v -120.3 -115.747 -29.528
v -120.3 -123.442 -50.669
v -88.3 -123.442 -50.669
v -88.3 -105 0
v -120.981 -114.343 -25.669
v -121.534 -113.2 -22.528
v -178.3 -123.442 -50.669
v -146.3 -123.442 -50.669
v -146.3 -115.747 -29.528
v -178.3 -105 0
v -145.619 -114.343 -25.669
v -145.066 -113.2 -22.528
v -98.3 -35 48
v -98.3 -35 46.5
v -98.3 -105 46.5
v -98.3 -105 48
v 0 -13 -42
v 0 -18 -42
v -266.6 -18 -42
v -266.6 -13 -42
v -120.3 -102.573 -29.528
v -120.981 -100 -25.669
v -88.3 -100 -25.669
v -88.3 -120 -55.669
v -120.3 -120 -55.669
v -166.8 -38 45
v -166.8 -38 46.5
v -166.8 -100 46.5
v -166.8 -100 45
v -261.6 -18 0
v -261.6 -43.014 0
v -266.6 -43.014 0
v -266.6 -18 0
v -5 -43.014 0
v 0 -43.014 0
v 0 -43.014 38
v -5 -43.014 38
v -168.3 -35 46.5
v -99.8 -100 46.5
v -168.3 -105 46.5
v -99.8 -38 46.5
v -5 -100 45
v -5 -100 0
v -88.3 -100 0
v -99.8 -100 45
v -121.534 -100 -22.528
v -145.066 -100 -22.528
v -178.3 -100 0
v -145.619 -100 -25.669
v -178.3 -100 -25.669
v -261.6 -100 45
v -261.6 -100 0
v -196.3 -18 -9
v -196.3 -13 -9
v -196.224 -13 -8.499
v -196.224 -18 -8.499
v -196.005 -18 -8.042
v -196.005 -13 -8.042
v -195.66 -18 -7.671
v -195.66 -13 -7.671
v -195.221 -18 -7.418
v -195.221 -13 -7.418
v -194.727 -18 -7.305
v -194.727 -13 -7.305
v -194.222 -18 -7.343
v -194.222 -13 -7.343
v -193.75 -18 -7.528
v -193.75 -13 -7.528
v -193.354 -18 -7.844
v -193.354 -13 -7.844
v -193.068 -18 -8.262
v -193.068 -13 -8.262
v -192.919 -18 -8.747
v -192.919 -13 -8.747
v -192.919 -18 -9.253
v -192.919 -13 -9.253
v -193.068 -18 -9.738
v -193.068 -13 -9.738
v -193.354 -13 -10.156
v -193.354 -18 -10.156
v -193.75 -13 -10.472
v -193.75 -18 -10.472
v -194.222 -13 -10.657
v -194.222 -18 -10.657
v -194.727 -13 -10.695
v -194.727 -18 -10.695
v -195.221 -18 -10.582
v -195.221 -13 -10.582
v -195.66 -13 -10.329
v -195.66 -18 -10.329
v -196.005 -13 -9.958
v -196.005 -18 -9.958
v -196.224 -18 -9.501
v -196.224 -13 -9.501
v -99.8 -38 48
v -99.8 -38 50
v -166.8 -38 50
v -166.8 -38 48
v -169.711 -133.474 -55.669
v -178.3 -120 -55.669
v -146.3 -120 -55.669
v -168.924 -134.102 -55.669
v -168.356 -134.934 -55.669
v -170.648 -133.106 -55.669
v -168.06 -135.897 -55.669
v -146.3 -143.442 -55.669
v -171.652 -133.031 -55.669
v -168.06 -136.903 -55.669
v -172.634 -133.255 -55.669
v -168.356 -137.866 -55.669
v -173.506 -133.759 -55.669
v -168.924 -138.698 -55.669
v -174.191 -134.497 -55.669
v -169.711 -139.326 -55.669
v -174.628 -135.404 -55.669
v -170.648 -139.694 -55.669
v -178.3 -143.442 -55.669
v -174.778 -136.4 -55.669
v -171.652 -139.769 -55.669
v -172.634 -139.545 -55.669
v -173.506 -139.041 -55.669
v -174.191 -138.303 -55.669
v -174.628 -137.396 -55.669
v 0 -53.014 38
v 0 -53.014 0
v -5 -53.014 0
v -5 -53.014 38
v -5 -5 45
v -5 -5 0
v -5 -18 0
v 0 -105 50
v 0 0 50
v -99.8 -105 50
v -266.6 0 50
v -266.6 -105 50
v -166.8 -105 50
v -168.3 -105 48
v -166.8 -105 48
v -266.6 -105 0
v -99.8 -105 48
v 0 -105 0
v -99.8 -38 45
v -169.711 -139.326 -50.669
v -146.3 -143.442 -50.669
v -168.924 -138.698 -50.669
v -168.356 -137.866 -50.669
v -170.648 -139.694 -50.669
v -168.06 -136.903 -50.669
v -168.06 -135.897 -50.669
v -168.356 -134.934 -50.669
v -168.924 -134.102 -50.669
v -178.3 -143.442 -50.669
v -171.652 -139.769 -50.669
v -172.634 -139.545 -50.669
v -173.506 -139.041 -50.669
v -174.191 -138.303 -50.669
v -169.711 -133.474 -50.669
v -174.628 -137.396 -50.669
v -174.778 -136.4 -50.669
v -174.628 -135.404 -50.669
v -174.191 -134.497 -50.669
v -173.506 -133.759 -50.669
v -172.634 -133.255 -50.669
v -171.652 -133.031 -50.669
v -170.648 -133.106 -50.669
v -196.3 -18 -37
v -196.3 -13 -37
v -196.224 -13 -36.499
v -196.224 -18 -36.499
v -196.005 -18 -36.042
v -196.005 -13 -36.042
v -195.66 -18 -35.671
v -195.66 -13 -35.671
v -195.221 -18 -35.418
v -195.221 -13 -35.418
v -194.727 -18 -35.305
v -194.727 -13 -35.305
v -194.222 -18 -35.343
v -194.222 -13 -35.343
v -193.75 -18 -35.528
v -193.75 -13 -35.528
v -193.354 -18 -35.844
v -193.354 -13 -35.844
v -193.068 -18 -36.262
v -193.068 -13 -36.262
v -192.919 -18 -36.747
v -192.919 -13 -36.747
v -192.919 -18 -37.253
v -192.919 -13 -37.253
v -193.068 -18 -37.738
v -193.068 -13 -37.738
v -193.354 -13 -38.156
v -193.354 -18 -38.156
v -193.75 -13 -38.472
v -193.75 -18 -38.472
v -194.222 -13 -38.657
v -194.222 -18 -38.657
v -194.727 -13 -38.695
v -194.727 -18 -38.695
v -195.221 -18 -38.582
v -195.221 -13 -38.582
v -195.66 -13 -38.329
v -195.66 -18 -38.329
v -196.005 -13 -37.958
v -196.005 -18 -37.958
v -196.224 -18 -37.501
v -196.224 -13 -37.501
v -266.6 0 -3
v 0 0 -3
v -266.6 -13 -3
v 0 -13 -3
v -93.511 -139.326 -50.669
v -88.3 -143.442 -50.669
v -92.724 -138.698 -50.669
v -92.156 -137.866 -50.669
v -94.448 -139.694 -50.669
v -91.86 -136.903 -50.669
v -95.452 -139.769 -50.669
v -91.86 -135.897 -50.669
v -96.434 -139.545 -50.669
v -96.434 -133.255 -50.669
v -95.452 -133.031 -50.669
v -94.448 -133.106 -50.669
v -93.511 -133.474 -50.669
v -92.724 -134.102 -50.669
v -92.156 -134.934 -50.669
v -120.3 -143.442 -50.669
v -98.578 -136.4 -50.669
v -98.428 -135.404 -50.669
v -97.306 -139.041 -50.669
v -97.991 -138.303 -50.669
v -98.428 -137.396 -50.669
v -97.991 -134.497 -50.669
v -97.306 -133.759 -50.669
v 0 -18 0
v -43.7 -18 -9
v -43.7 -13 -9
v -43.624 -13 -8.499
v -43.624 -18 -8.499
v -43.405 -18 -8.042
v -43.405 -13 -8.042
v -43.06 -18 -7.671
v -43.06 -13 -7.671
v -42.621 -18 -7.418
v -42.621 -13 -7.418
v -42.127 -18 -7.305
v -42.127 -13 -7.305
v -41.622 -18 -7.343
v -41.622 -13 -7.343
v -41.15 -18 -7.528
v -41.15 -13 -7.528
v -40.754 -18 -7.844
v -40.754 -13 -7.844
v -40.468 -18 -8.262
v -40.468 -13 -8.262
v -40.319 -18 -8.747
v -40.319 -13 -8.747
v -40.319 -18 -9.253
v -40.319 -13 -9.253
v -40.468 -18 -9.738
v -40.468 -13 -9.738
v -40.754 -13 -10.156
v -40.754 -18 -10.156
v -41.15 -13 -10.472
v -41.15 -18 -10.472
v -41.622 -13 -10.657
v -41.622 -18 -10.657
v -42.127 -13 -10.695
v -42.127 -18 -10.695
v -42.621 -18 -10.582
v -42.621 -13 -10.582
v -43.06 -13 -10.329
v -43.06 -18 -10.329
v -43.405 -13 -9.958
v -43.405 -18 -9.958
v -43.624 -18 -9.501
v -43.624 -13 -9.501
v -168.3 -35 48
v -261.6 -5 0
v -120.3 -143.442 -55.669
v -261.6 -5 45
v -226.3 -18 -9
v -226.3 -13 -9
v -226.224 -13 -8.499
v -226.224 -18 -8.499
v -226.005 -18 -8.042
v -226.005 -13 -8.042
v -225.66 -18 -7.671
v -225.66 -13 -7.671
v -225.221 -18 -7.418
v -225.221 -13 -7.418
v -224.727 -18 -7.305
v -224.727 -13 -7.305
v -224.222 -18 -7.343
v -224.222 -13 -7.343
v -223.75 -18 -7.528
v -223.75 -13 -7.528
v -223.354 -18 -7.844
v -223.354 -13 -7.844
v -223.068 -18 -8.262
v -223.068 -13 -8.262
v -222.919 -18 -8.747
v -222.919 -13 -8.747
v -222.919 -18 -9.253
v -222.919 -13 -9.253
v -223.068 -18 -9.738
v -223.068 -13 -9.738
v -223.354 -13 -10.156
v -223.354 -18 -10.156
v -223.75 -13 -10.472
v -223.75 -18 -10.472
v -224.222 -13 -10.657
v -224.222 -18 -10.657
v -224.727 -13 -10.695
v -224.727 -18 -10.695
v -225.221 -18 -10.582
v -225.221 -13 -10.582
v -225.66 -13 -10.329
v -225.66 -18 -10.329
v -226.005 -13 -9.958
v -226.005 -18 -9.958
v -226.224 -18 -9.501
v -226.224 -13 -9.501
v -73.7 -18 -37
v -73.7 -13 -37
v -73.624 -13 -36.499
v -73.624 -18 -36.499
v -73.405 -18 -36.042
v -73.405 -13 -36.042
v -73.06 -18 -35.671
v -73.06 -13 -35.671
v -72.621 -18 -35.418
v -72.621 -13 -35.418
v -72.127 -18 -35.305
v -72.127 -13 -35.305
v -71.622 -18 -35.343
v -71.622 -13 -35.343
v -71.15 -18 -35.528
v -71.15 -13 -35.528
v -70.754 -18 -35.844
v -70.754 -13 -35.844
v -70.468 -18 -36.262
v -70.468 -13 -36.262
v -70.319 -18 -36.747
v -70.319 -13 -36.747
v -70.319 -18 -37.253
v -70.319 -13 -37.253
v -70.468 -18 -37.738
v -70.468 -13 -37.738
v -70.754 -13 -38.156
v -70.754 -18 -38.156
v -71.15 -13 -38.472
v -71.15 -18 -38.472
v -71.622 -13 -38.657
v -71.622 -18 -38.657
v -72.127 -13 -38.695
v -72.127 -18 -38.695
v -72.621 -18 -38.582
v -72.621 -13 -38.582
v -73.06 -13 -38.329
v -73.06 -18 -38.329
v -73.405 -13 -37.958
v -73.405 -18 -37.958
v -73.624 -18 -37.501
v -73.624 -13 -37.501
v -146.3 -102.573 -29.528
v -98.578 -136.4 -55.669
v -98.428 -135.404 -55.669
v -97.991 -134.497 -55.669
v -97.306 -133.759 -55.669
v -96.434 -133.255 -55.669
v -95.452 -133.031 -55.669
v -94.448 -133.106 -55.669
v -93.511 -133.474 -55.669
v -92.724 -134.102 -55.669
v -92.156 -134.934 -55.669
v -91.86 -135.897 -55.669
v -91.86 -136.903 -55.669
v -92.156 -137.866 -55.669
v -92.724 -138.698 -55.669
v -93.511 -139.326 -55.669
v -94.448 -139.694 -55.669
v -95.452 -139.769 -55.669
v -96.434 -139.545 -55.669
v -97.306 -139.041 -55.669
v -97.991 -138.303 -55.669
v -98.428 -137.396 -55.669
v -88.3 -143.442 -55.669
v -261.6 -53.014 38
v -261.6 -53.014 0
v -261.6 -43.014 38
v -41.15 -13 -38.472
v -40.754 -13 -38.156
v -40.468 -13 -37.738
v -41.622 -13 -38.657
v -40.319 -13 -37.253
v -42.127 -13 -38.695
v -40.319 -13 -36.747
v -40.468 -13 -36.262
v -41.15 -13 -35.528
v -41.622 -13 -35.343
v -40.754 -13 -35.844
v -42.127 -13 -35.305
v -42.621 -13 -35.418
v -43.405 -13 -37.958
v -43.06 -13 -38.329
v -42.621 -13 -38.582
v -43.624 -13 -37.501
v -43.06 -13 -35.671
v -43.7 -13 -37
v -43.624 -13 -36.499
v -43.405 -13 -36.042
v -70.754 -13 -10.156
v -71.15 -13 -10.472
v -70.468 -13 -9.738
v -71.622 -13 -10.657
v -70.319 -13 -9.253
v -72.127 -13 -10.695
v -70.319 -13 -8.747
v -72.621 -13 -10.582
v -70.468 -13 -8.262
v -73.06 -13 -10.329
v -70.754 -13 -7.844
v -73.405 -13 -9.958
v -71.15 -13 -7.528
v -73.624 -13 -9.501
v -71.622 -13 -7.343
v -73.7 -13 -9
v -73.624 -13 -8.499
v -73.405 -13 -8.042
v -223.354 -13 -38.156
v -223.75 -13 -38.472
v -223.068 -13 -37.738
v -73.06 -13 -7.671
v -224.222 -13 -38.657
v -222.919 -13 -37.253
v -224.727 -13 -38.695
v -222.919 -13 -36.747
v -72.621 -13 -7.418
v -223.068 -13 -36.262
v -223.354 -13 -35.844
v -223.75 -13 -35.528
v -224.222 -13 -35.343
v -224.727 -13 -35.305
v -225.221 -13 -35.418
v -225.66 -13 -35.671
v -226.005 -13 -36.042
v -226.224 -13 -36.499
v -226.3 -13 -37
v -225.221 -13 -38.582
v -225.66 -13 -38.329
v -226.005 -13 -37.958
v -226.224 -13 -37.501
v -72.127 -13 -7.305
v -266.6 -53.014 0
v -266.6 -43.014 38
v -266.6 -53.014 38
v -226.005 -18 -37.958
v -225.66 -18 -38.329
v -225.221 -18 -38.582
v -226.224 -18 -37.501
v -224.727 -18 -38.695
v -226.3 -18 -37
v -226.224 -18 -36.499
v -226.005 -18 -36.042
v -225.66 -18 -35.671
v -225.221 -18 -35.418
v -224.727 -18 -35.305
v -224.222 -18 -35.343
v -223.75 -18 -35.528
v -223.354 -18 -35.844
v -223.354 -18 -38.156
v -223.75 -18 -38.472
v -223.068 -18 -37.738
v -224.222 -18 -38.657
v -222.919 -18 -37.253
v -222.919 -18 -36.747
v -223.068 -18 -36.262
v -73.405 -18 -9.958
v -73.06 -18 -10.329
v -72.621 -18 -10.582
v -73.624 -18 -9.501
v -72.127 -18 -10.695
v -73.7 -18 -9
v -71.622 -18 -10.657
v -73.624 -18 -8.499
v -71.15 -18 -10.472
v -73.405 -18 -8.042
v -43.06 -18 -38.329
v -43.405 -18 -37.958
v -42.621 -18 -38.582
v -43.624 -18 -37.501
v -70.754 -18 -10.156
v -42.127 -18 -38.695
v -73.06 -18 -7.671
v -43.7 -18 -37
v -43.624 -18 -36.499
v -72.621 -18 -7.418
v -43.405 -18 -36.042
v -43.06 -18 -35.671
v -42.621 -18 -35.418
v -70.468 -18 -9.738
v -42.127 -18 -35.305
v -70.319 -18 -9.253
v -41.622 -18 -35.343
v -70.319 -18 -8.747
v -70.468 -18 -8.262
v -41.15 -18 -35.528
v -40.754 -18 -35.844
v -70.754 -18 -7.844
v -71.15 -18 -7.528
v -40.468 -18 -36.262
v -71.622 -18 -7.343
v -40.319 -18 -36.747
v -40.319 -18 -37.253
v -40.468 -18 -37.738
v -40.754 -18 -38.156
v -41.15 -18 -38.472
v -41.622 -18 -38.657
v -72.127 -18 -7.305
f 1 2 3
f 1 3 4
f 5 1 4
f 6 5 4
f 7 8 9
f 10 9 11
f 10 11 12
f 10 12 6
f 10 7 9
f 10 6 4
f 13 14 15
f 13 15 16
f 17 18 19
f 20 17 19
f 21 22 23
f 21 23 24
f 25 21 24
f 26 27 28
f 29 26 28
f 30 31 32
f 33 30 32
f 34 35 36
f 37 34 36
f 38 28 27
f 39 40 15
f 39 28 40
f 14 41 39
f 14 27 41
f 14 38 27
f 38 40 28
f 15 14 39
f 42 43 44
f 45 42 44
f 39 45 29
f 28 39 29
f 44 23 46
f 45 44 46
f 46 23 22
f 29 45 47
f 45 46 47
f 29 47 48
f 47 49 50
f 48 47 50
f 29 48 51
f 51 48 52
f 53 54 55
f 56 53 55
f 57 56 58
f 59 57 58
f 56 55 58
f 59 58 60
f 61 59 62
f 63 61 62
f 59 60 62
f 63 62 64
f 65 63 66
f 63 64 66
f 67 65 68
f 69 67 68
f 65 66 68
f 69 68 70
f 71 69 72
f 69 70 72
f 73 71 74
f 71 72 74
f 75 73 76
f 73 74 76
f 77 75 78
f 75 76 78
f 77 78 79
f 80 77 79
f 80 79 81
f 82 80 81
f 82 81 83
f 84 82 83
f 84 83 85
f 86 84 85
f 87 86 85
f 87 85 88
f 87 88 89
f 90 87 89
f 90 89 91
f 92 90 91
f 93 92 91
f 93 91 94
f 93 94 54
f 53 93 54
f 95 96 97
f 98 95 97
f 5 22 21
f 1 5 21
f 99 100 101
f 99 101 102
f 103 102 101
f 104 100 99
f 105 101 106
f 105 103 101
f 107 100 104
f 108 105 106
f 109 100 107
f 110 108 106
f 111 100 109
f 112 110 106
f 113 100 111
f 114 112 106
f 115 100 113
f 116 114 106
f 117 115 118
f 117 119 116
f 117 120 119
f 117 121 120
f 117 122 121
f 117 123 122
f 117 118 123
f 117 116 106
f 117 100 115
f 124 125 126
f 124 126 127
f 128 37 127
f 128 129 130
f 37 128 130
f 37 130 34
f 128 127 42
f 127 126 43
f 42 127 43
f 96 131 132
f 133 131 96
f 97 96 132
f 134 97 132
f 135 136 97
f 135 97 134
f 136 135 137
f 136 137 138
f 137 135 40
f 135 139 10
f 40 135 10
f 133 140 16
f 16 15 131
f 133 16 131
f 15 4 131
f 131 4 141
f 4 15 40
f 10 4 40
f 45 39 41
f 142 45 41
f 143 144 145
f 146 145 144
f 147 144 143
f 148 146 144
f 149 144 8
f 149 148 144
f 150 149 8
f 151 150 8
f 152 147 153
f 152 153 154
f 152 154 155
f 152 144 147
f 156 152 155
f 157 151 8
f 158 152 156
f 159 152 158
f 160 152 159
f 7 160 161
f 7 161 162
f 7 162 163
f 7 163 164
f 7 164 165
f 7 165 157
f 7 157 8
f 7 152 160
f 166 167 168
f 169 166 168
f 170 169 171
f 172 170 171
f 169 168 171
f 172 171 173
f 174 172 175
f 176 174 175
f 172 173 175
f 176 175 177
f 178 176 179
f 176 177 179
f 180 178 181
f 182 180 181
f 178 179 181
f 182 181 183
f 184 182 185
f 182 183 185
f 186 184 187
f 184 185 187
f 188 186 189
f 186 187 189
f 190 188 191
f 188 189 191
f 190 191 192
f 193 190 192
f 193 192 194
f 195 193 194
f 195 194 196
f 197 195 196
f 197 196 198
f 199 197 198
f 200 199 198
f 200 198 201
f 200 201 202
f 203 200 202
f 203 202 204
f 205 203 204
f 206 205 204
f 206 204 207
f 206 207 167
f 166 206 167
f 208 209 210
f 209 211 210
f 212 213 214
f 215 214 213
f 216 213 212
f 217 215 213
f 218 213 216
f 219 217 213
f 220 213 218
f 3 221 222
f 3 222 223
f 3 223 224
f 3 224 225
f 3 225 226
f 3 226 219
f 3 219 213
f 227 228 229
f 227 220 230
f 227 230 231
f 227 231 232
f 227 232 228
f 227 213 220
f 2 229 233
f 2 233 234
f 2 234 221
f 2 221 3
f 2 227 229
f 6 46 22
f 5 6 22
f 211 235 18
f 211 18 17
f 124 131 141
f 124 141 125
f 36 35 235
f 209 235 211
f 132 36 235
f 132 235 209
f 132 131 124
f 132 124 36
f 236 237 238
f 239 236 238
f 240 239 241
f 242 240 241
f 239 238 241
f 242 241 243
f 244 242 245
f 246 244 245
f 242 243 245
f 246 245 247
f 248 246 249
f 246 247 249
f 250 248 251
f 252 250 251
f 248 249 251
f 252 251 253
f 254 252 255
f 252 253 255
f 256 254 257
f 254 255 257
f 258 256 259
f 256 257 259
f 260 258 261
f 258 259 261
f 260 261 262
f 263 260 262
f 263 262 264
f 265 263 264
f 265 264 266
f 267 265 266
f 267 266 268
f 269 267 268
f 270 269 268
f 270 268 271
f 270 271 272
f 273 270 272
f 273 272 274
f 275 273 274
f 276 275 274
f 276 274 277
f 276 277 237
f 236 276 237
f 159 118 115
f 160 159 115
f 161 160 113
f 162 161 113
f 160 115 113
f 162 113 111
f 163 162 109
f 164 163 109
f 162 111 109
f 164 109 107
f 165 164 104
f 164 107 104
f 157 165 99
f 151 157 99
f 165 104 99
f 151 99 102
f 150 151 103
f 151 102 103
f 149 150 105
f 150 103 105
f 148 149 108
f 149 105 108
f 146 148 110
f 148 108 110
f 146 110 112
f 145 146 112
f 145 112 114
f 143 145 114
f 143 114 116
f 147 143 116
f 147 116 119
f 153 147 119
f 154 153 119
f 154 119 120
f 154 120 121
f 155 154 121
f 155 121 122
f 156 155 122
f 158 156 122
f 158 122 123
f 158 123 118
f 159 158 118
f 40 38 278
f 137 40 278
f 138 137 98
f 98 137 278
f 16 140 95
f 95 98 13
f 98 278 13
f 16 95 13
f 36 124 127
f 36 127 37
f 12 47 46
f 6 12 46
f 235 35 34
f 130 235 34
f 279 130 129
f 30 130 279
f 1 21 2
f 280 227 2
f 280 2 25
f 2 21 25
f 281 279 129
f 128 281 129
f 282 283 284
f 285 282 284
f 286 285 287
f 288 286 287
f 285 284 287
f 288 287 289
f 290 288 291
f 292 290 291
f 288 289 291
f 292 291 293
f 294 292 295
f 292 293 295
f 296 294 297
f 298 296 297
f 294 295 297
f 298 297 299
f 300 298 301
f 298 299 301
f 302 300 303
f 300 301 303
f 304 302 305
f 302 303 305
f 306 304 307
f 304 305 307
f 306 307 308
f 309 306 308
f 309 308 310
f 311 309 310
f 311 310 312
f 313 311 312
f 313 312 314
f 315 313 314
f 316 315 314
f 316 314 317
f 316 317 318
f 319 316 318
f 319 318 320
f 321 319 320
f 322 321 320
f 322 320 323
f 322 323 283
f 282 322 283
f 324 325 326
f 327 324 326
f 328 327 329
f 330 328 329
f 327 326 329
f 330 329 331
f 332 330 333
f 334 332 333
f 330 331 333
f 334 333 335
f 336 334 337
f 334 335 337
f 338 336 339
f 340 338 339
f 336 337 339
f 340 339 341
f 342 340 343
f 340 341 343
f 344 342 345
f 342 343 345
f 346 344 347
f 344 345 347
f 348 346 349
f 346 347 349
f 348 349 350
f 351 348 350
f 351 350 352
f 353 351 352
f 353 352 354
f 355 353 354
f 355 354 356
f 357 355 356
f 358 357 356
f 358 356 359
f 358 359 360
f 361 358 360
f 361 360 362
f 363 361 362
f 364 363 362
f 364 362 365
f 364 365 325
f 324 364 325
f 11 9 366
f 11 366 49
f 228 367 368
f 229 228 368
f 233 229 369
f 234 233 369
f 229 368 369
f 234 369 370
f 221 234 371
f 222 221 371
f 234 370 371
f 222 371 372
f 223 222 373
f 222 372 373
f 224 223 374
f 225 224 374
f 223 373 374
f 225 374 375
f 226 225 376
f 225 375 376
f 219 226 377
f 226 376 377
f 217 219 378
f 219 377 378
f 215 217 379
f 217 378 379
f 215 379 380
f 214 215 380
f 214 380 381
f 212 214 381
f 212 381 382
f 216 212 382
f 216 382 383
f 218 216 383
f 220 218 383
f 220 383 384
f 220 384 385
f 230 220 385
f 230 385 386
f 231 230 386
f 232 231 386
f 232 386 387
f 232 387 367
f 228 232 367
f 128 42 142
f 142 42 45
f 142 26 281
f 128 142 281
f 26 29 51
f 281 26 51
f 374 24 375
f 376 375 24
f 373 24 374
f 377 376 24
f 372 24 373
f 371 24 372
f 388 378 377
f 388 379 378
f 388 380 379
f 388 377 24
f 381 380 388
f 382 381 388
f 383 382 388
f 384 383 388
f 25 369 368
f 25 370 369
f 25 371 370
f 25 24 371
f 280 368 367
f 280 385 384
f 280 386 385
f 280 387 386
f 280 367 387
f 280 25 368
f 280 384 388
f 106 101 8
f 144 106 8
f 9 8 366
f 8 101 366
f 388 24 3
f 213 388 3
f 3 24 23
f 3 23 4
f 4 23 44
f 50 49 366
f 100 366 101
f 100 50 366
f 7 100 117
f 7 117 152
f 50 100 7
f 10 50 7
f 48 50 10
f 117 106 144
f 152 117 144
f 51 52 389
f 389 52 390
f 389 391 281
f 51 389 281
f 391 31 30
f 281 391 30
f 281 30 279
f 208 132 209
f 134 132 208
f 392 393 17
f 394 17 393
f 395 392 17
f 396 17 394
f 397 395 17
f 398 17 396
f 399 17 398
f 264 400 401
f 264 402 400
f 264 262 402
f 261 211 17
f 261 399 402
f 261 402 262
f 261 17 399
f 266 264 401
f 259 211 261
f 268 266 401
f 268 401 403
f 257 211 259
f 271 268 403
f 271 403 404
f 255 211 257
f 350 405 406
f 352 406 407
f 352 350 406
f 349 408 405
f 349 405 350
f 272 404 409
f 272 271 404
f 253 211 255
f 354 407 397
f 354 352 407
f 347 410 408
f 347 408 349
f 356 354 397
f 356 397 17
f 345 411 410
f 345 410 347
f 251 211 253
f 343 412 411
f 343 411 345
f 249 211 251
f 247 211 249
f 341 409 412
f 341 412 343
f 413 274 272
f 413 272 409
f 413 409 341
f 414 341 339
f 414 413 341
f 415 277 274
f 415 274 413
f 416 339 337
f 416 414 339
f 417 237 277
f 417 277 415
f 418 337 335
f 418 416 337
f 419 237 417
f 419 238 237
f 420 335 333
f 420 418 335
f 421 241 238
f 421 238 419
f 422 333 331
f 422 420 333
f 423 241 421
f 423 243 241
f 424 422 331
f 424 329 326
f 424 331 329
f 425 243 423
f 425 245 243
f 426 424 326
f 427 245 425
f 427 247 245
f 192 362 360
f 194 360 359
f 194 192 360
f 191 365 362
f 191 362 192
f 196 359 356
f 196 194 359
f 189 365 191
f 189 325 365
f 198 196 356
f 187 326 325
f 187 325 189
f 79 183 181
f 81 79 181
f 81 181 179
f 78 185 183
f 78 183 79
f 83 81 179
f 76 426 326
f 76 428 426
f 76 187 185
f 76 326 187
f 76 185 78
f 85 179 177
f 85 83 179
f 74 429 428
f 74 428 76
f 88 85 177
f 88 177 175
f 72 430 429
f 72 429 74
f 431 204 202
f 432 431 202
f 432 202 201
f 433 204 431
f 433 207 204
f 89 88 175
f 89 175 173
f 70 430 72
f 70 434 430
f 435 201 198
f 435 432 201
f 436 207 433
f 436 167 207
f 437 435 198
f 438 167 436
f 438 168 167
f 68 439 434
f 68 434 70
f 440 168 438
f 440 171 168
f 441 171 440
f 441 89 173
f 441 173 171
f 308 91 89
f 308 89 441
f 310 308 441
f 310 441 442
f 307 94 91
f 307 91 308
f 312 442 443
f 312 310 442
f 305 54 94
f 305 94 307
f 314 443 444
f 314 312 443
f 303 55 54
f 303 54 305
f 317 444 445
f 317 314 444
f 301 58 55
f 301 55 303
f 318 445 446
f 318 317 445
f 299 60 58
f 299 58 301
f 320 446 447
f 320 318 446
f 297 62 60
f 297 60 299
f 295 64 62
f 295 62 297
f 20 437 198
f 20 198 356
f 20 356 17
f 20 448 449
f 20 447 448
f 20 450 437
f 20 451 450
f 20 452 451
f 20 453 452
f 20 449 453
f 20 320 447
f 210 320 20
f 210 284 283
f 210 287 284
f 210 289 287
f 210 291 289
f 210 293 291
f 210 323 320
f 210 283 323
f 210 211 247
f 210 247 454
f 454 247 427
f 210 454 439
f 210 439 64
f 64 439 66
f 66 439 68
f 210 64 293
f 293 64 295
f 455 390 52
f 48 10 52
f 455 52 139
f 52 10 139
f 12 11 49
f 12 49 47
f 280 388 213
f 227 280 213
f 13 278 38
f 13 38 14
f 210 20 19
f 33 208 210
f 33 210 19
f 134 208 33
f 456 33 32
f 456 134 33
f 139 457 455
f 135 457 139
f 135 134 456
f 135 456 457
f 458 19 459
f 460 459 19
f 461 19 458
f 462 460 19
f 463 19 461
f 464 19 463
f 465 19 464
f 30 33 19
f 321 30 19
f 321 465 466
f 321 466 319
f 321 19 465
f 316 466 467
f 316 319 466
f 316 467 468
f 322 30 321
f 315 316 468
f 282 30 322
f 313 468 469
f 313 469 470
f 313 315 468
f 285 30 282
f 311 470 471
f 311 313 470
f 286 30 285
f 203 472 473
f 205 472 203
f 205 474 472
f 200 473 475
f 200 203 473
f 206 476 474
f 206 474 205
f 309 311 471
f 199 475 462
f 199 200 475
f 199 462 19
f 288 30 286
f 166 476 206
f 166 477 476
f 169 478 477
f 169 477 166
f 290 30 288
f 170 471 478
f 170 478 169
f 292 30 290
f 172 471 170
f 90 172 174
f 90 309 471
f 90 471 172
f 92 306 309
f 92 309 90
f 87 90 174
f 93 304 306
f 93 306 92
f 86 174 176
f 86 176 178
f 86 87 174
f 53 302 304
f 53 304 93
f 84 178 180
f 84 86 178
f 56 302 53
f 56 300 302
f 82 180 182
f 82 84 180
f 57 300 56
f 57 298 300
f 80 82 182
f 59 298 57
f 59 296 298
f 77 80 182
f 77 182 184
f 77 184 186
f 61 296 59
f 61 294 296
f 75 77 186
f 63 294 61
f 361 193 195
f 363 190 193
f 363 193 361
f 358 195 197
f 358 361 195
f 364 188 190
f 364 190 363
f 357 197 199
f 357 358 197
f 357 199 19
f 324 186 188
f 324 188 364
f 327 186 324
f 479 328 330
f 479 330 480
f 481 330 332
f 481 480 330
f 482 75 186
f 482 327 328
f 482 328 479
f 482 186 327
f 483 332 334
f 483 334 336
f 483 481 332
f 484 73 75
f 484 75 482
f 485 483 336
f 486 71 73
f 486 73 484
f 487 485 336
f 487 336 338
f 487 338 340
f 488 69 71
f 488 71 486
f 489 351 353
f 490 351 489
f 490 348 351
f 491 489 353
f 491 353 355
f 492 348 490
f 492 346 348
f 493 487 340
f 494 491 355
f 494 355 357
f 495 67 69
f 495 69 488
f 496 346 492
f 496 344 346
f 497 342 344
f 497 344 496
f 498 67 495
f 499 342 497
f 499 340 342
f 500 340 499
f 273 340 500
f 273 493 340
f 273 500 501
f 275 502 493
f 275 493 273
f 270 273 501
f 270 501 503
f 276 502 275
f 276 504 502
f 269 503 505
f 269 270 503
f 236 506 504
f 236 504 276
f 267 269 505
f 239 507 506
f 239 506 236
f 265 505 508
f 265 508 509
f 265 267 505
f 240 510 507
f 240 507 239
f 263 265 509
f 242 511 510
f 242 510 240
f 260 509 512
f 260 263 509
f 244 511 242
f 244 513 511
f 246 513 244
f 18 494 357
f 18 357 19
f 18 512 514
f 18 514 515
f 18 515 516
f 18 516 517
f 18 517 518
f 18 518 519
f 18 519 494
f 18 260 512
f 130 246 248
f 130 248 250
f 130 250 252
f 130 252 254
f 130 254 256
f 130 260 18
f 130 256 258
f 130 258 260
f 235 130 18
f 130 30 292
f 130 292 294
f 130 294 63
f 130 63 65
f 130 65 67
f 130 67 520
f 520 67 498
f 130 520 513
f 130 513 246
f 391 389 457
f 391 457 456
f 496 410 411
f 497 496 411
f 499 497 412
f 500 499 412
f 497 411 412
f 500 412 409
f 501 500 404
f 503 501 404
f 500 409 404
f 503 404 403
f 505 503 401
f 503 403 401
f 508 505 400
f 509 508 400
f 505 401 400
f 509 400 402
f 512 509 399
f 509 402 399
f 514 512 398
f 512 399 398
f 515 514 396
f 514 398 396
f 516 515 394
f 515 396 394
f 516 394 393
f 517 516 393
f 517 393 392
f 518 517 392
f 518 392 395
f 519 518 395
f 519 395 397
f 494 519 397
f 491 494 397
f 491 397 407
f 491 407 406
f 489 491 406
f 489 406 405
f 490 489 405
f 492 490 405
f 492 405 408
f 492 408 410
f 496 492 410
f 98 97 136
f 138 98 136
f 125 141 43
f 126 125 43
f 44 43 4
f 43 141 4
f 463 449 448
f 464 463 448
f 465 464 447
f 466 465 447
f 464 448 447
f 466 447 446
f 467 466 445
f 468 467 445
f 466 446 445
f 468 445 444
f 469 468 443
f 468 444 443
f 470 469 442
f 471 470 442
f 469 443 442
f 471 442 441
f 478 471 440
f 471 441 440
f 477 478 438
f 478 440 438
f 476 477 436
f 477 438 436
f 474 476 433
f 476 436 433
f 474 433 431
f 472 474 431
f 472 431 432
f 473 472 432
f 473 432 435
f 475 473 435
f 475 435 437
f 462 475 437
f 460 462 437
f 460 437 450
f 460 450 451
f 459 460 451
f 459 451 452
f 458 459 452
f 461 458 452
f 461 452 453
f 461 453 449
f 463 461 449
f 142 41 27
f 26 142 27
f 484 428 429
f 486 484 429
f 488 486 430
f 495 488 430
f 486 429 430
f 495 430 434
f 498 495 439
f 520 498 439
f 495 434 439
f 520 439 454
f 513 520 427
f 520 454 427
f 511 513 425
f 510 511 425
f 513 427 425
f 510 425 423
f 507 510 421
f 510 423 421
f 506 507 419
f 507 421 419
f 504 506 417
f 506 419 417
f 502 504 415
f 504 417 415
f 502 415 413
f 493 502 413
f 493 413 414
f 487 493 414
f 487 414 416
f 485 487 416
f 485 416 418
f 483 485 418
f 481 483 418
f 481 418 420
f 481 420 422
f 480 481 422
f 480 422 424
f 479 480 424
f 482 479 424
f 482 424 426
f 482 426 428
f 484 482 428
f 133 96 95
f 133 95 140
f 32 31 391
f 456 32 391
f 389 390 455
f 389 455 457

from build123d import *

# Parameters (mm, degrees)
SKETCH1_W                     = 5
SKETCH1_H                     = 47.5
SKETCH1_W_2                   = 67
SKETCH1_H_2                   = 5
SKETCH1_H_3                   = 34.5
SKETCH1_H_4                   = 8
WALLS_DEPTH                   = 50
ROOF_START                    = 50
SKETCH1_3_W                   = 266.6000032
SKETCH1_3_H                   = 105
SKETCH1_3_W_2                 = 67
SKETCH1_3_H_2                 = 67
ROOF_DEPTH                    = 5
SKETCH1_4_W                   = 256.6000032
SKETCH1_4_H                   = 5
SKETCH1_4_W_2                 = 5
SPACER_DEPTH                  = 42
FIBER_CUTOUT_DEPTH            = 291.861757036
FIBER_CUTOUT_DEPTH_BACK       = 291.861757036
SKETCH2_W                     = 38
SKETCH2_H                     = 10
M3_CLEARANCE_HOLE_D           = 3.4
SKETCH1_6_W                   = 5
SKETCH1_6_H                   = 8
SKETCH1_6_W_2                 = 256.6000032
REAR_WALL_FLOOR_DEPTH         = 3
WINDOW_THROUGH_CUT_DEPTH      = 291.861757036
WINDOW_THROUGH_CUT_DEPTH_BACK = 70
SKETCH6_W                     = 70
SKETCH6_H                     = 1.5
WINDOW_START                  = 50
SKETCH1_8_W                   = 67
SKETCH1_8_H                   = 47.5
SKETCH1_8_H_2                 = 14.5
WINDOW_SLOT_CUT_DEPTH         = 5
SKETCH1_9_W                   = 67
SKETCH1_9_H                   = 5
WINDOW_EDGE_THROUGH_CUT_DEPTH = 3.5
FRONT_LEG_MOUNTING_DEPTH      = 45
FRONT_LEG_MOUNTING_DEPTH_BACK = 45
F_1_4_CLEARANCE_HOLE1_D       = 6.7564
FRONT_HOLE_CUTOUT_REACH       = 292.129


with BuildPart() as part:
    # Sketch1 → Walls (new body)
    with BuildSketch(Plane(origin=(0, 0, 0), x_dir=(-1, 0, 0), z_dir=(0, 0, 1))):
        Polygon((0, 105), (0, 100), (5, 100), (99.8000016, 100), (99.8000016, 105), align=None)
        Polygon((166.8000016, 100), (261.6000032, 100), (266.6000032, 100), (266.6000032, 105), (166.8000016, 105), align=None)
        with Locations((264.1000032, 76.25)):
            Rectangle(SKETCH1_W, SKETCH1_H)
        with Locations((133.3000016, 102.5)):
            Rectangle(SKETCH1_W_2, SKETCH1_H_2)
        with Locations((264.1000032, 35.25)):
            Rectangle(SKETCH1_W, SKETCH1_H_3)
        with Locations((264.1000032, 15.5)):
            Rectangle(SKETCH1_W, SKETCH1_H_2)
        with Locations((264.1000032, 9)):
            Rectangle(SKETCH1_W, SKETCH1_H_4)
        Polygon((5, 5), (0, 5), (0, 0), (266.6000032, 0), (266.6000032, 5), (261.6000032, 5), align=None)
        with Locations((2.5, 9)):
            Rectangle(SKETCH1_W, SKETCH1_H_4)
        with Locations((2.5, 15.5)):
            Rectangle(SKETCH1_W, SKETCH1_H_2)
        with Locations((2.5, 35.25)):
            Rectangle(SKETCH1_W, SKETCH1_H_3)
        with Locations((2.5, 76.25)):
            Rectangle(SKETCH1_W, SKETCH1_H)
    extrude(amount=WALLS_DEPTH)

    # Sketch1<3> → roof (add)
    with BuildSketch(Plane(origin=(0, 0, 0), x_dir=(-1, 0, 0), z_dir=(0, 0, 1)).offset(ROOF_START)):
        with Locations((133.3000016, 52.5)):
            Rectangle(SKETCH1_3_W, SKETCH1_3_H)
        with Locations((133.3000016, 71.5)):
            Rectangle(SKETCH1_3_W_2, SKETCH1_3_H_2)
    extrude(amount=-ROOF_DEPTH)

    # Sketch1<4> → spacer (add)
    with BuildSketch(Plane(origin=(0, 0, 0), x_dir=(-1, 0, 0), z_dir=(0, 0, 1))):
        with Locations((133.3000016, 15.5)):
            Rectangle(SKETCH1_4_W, SKETCH1_4_H)
        with Locations((2.5, 15.5)):
            Rectangle(SKETCH1_4_W_2, SKETCH1_4_H)
        with Locations((264.1000032, 15.5)):
            Rectangle(SKETCH1_4_W_2, SKETCH1_4_H)
    extrude(amount=-SPACER_DEPTH)

    # Sketch2 → fiber cutout (cut, two sides: drawn at the far end of the back side and taken through both)
    with BuildSketch(Plane.ZY.offset(266.6000032).offset(-FIBER_CUTOUT_DEPTH_BACK)):
        with Locations((19, -48.0141)):
            Rectangle(SKETCH2_W, SKETCH2_H)
    extrude(amount=FIBER_CUTOUT_DEPTH + FIBER_CUTOUT_DEPTH_BACK, mode=Mode.SUBTRACT)

    # M3 Clearance Hole (through all)
    with Locations(Plane.XZ.offset(18)):
        with Locations((-224.6, -9), (-42, -9), (-72, -9), (-72, -37), (-42, -37), (-224.6, -37), (-194.6, -37), (-194.6, -9)):
            Hole(M3_CLEARANCE_HOLE_D / 2)

    # Sketch1<6> → rear wall floor (add)
    with BuildSketch(Plane(origin=(0, 0, 0), x_dir=(-1, 0, 0), z_dir=(0, 0, 1))):
        Polygon((5, 5), (0, 5), (0, 0), (266.6000032, 0), (266.6000032, 5), (261.6000032, 5), align=None)
        with Locations((2.5, 9)):
            Rectangle(SKETCH1_6_W, SKETCH1_6_H)
        with Locations((133.3000016, 9)):
            Rectangle(SKETCH1_6_W_2, SKETCH1_6_H)
        with Locations((264.1000032, 9)):
            Rectangle(SKETCH1_6_W, SKETCH1_6_H)
    extrude(amount=-REAR_WALL_FLOOR_DEPTH)

    # Sketch6 → window through cut (cut, two sides: drawn at the far end of the back side and taken through both)
    with BuildSketch(Plane.XZ.offset(105).offset(-WINDOW_THROUGH_CUT_DEPTH_BACK)):
        with Locations((-133.3000016, 47.25)):
            Rectangle(SKETCH6_W, SKETCH6_H)
    extrude(amount=WINDOW_THROUGH_CUT_DEPTH + WINDOW_THROUGH_CUT_DEPTH_BACK, mode=Mode.SUBTRACT)

    # Sketch1<8> → window slot cut (cut)
    with BuildSketch(Plane(origin=(0, 0, 0), x_dir=(-1, 0, 0), z_dir=(0, 0, 1)).offset(WINDOW_START)):
        with Locations((133.3000016, 76.25)):
            Rectangle(SKETCH1_8_W, SKETCH1_8_H)
        with Locations((133.3000016, 45.25)):
            Rectangle(SKETCH1_8_W, SKETCH1_8_H_2)
    extrude(amount=-WINDOW_SLOT_CUT_DEPTH, mode=Mode.SUBTRACT)

    # Sketch1<9> → window edge through cut (cut)
    with BuildSketch(Plane(origin=(0, 0, 0), x_dir=(-1, 0, 0), z_dir=(0, 0, 1)).offset(WINDOW_START)):
        with Locations((133.3000016, 102.5)):
            Rectangle(SKETCH1_9_W, SKETCH1_9_H)
    extrude(amount=-WINDOW_EDGE_THROUGH_CUT_DEPTH, mode=Mode.SUBTRACT)

    # Sketch7 → Front leg mounting (add, two sides: drawn at the far end of the back side and taken through both)
    with BuildSketch(Plane(origin=(-133.3000016, 0, 50), x_dir=(0, 0, -1), z_dir=(1, 0, 0)).offset(-FRONT_LEG_MOUNTING_DEPTH_BACK)):
        Polygon((105.668753763, -120), (105.668753763, -143.441918177), (100.668753763, -143.441918177), (100.668753763, -123.441918177), (50, -105), (50, -100), (75.668753763, -100), align=None)
    extrude(amount=FRONT_LEG_MOUNTING_DEPTH + FRONT_LEG_MOUNTING_DEPTH_BACK)

    # 1/4 Clearance Hole1 (through all)
    with Locations(Plane.XY.offset(-50.668753763)):
        with Locations((-95.2000016, -136.4), (-171.4000016, -136.4)):
            Hole(F_1_4_CLEARANCE_HOLE1_D / 2)

    # Front hole cutout: up to this face of the body (flat: up to its plane)
    front_hole_cutout_end = Plane(part.part.faces().sort_by_distance((-133.3000016, -143.441918177, -53.168753763))[0])
    # Sketch11 → Front hole cutout (cut, up to the picked face)
    with BuildSketch(Plane(origin=(0, -100, 0), x_dir=(1, 0, 0), z_dir=(0, 1, 0)), mode=Mode.PRIVATE) as front_hole_cutout_sk1:
        Polygon((-146.3000016, 55.668753763), (-146.3000016, 29.5285), (-145.6194242, 25.668753763), (-120.980579, 25.668753763), (-120.3000016, 29.5285), (-120.3000016, 55.668753763), align=None)
    front_hole_cutout_tool1 = split(extrude(front_hole_cutout_sk1.sketch, amount=-FRONT_HOLE_CUTOUT_REACH, mode=Mode.PRIVATE), bisect_by=front_hole_cutout_end, keep=Keep.BOTH, mode=Mode.PRIVATE)
    # Sketch11 → Front hole cutout (cut, up to the picked face)
    with BuildSketch(Plane(origin=(0, -100, 0), x_dir=(1, 0, 0), z_dir=(0, 1, 0)), mode=Mode.PRIVATE) as front_hole_cutout_sk2:
        Polygon((-120.980579, 25.668753763), (-145.6194242, 25.668753763), (-145.065712735, 22.5285), (-121.534290465, 22.5285), align=None)
    front_hole_cutout_tool2 = split(extrude(front_hole_cutout_sk2.sketch, amount=-FRONT_HOLE_CUTOUT_REACH, mode=Mode.PRIVATE), bisect_by=front_hole_cutout_end, keep=Keep.BOTH, mode=Mode.PRIVATE)
    add(front_hole_cutout_tool1.solids().sort_by(Axis((-133.300002, -100, -40.715093), (0, -1, 0)))[0], mode=Mode.SUBTRACT)
    add(front_hole_cutout_tool2.solids().sort_by(Axis((-133.300002, -100, -24.110659), (0, -1, 0)))[0], mode=Mode.SUBTRACT)


solid = part.part
